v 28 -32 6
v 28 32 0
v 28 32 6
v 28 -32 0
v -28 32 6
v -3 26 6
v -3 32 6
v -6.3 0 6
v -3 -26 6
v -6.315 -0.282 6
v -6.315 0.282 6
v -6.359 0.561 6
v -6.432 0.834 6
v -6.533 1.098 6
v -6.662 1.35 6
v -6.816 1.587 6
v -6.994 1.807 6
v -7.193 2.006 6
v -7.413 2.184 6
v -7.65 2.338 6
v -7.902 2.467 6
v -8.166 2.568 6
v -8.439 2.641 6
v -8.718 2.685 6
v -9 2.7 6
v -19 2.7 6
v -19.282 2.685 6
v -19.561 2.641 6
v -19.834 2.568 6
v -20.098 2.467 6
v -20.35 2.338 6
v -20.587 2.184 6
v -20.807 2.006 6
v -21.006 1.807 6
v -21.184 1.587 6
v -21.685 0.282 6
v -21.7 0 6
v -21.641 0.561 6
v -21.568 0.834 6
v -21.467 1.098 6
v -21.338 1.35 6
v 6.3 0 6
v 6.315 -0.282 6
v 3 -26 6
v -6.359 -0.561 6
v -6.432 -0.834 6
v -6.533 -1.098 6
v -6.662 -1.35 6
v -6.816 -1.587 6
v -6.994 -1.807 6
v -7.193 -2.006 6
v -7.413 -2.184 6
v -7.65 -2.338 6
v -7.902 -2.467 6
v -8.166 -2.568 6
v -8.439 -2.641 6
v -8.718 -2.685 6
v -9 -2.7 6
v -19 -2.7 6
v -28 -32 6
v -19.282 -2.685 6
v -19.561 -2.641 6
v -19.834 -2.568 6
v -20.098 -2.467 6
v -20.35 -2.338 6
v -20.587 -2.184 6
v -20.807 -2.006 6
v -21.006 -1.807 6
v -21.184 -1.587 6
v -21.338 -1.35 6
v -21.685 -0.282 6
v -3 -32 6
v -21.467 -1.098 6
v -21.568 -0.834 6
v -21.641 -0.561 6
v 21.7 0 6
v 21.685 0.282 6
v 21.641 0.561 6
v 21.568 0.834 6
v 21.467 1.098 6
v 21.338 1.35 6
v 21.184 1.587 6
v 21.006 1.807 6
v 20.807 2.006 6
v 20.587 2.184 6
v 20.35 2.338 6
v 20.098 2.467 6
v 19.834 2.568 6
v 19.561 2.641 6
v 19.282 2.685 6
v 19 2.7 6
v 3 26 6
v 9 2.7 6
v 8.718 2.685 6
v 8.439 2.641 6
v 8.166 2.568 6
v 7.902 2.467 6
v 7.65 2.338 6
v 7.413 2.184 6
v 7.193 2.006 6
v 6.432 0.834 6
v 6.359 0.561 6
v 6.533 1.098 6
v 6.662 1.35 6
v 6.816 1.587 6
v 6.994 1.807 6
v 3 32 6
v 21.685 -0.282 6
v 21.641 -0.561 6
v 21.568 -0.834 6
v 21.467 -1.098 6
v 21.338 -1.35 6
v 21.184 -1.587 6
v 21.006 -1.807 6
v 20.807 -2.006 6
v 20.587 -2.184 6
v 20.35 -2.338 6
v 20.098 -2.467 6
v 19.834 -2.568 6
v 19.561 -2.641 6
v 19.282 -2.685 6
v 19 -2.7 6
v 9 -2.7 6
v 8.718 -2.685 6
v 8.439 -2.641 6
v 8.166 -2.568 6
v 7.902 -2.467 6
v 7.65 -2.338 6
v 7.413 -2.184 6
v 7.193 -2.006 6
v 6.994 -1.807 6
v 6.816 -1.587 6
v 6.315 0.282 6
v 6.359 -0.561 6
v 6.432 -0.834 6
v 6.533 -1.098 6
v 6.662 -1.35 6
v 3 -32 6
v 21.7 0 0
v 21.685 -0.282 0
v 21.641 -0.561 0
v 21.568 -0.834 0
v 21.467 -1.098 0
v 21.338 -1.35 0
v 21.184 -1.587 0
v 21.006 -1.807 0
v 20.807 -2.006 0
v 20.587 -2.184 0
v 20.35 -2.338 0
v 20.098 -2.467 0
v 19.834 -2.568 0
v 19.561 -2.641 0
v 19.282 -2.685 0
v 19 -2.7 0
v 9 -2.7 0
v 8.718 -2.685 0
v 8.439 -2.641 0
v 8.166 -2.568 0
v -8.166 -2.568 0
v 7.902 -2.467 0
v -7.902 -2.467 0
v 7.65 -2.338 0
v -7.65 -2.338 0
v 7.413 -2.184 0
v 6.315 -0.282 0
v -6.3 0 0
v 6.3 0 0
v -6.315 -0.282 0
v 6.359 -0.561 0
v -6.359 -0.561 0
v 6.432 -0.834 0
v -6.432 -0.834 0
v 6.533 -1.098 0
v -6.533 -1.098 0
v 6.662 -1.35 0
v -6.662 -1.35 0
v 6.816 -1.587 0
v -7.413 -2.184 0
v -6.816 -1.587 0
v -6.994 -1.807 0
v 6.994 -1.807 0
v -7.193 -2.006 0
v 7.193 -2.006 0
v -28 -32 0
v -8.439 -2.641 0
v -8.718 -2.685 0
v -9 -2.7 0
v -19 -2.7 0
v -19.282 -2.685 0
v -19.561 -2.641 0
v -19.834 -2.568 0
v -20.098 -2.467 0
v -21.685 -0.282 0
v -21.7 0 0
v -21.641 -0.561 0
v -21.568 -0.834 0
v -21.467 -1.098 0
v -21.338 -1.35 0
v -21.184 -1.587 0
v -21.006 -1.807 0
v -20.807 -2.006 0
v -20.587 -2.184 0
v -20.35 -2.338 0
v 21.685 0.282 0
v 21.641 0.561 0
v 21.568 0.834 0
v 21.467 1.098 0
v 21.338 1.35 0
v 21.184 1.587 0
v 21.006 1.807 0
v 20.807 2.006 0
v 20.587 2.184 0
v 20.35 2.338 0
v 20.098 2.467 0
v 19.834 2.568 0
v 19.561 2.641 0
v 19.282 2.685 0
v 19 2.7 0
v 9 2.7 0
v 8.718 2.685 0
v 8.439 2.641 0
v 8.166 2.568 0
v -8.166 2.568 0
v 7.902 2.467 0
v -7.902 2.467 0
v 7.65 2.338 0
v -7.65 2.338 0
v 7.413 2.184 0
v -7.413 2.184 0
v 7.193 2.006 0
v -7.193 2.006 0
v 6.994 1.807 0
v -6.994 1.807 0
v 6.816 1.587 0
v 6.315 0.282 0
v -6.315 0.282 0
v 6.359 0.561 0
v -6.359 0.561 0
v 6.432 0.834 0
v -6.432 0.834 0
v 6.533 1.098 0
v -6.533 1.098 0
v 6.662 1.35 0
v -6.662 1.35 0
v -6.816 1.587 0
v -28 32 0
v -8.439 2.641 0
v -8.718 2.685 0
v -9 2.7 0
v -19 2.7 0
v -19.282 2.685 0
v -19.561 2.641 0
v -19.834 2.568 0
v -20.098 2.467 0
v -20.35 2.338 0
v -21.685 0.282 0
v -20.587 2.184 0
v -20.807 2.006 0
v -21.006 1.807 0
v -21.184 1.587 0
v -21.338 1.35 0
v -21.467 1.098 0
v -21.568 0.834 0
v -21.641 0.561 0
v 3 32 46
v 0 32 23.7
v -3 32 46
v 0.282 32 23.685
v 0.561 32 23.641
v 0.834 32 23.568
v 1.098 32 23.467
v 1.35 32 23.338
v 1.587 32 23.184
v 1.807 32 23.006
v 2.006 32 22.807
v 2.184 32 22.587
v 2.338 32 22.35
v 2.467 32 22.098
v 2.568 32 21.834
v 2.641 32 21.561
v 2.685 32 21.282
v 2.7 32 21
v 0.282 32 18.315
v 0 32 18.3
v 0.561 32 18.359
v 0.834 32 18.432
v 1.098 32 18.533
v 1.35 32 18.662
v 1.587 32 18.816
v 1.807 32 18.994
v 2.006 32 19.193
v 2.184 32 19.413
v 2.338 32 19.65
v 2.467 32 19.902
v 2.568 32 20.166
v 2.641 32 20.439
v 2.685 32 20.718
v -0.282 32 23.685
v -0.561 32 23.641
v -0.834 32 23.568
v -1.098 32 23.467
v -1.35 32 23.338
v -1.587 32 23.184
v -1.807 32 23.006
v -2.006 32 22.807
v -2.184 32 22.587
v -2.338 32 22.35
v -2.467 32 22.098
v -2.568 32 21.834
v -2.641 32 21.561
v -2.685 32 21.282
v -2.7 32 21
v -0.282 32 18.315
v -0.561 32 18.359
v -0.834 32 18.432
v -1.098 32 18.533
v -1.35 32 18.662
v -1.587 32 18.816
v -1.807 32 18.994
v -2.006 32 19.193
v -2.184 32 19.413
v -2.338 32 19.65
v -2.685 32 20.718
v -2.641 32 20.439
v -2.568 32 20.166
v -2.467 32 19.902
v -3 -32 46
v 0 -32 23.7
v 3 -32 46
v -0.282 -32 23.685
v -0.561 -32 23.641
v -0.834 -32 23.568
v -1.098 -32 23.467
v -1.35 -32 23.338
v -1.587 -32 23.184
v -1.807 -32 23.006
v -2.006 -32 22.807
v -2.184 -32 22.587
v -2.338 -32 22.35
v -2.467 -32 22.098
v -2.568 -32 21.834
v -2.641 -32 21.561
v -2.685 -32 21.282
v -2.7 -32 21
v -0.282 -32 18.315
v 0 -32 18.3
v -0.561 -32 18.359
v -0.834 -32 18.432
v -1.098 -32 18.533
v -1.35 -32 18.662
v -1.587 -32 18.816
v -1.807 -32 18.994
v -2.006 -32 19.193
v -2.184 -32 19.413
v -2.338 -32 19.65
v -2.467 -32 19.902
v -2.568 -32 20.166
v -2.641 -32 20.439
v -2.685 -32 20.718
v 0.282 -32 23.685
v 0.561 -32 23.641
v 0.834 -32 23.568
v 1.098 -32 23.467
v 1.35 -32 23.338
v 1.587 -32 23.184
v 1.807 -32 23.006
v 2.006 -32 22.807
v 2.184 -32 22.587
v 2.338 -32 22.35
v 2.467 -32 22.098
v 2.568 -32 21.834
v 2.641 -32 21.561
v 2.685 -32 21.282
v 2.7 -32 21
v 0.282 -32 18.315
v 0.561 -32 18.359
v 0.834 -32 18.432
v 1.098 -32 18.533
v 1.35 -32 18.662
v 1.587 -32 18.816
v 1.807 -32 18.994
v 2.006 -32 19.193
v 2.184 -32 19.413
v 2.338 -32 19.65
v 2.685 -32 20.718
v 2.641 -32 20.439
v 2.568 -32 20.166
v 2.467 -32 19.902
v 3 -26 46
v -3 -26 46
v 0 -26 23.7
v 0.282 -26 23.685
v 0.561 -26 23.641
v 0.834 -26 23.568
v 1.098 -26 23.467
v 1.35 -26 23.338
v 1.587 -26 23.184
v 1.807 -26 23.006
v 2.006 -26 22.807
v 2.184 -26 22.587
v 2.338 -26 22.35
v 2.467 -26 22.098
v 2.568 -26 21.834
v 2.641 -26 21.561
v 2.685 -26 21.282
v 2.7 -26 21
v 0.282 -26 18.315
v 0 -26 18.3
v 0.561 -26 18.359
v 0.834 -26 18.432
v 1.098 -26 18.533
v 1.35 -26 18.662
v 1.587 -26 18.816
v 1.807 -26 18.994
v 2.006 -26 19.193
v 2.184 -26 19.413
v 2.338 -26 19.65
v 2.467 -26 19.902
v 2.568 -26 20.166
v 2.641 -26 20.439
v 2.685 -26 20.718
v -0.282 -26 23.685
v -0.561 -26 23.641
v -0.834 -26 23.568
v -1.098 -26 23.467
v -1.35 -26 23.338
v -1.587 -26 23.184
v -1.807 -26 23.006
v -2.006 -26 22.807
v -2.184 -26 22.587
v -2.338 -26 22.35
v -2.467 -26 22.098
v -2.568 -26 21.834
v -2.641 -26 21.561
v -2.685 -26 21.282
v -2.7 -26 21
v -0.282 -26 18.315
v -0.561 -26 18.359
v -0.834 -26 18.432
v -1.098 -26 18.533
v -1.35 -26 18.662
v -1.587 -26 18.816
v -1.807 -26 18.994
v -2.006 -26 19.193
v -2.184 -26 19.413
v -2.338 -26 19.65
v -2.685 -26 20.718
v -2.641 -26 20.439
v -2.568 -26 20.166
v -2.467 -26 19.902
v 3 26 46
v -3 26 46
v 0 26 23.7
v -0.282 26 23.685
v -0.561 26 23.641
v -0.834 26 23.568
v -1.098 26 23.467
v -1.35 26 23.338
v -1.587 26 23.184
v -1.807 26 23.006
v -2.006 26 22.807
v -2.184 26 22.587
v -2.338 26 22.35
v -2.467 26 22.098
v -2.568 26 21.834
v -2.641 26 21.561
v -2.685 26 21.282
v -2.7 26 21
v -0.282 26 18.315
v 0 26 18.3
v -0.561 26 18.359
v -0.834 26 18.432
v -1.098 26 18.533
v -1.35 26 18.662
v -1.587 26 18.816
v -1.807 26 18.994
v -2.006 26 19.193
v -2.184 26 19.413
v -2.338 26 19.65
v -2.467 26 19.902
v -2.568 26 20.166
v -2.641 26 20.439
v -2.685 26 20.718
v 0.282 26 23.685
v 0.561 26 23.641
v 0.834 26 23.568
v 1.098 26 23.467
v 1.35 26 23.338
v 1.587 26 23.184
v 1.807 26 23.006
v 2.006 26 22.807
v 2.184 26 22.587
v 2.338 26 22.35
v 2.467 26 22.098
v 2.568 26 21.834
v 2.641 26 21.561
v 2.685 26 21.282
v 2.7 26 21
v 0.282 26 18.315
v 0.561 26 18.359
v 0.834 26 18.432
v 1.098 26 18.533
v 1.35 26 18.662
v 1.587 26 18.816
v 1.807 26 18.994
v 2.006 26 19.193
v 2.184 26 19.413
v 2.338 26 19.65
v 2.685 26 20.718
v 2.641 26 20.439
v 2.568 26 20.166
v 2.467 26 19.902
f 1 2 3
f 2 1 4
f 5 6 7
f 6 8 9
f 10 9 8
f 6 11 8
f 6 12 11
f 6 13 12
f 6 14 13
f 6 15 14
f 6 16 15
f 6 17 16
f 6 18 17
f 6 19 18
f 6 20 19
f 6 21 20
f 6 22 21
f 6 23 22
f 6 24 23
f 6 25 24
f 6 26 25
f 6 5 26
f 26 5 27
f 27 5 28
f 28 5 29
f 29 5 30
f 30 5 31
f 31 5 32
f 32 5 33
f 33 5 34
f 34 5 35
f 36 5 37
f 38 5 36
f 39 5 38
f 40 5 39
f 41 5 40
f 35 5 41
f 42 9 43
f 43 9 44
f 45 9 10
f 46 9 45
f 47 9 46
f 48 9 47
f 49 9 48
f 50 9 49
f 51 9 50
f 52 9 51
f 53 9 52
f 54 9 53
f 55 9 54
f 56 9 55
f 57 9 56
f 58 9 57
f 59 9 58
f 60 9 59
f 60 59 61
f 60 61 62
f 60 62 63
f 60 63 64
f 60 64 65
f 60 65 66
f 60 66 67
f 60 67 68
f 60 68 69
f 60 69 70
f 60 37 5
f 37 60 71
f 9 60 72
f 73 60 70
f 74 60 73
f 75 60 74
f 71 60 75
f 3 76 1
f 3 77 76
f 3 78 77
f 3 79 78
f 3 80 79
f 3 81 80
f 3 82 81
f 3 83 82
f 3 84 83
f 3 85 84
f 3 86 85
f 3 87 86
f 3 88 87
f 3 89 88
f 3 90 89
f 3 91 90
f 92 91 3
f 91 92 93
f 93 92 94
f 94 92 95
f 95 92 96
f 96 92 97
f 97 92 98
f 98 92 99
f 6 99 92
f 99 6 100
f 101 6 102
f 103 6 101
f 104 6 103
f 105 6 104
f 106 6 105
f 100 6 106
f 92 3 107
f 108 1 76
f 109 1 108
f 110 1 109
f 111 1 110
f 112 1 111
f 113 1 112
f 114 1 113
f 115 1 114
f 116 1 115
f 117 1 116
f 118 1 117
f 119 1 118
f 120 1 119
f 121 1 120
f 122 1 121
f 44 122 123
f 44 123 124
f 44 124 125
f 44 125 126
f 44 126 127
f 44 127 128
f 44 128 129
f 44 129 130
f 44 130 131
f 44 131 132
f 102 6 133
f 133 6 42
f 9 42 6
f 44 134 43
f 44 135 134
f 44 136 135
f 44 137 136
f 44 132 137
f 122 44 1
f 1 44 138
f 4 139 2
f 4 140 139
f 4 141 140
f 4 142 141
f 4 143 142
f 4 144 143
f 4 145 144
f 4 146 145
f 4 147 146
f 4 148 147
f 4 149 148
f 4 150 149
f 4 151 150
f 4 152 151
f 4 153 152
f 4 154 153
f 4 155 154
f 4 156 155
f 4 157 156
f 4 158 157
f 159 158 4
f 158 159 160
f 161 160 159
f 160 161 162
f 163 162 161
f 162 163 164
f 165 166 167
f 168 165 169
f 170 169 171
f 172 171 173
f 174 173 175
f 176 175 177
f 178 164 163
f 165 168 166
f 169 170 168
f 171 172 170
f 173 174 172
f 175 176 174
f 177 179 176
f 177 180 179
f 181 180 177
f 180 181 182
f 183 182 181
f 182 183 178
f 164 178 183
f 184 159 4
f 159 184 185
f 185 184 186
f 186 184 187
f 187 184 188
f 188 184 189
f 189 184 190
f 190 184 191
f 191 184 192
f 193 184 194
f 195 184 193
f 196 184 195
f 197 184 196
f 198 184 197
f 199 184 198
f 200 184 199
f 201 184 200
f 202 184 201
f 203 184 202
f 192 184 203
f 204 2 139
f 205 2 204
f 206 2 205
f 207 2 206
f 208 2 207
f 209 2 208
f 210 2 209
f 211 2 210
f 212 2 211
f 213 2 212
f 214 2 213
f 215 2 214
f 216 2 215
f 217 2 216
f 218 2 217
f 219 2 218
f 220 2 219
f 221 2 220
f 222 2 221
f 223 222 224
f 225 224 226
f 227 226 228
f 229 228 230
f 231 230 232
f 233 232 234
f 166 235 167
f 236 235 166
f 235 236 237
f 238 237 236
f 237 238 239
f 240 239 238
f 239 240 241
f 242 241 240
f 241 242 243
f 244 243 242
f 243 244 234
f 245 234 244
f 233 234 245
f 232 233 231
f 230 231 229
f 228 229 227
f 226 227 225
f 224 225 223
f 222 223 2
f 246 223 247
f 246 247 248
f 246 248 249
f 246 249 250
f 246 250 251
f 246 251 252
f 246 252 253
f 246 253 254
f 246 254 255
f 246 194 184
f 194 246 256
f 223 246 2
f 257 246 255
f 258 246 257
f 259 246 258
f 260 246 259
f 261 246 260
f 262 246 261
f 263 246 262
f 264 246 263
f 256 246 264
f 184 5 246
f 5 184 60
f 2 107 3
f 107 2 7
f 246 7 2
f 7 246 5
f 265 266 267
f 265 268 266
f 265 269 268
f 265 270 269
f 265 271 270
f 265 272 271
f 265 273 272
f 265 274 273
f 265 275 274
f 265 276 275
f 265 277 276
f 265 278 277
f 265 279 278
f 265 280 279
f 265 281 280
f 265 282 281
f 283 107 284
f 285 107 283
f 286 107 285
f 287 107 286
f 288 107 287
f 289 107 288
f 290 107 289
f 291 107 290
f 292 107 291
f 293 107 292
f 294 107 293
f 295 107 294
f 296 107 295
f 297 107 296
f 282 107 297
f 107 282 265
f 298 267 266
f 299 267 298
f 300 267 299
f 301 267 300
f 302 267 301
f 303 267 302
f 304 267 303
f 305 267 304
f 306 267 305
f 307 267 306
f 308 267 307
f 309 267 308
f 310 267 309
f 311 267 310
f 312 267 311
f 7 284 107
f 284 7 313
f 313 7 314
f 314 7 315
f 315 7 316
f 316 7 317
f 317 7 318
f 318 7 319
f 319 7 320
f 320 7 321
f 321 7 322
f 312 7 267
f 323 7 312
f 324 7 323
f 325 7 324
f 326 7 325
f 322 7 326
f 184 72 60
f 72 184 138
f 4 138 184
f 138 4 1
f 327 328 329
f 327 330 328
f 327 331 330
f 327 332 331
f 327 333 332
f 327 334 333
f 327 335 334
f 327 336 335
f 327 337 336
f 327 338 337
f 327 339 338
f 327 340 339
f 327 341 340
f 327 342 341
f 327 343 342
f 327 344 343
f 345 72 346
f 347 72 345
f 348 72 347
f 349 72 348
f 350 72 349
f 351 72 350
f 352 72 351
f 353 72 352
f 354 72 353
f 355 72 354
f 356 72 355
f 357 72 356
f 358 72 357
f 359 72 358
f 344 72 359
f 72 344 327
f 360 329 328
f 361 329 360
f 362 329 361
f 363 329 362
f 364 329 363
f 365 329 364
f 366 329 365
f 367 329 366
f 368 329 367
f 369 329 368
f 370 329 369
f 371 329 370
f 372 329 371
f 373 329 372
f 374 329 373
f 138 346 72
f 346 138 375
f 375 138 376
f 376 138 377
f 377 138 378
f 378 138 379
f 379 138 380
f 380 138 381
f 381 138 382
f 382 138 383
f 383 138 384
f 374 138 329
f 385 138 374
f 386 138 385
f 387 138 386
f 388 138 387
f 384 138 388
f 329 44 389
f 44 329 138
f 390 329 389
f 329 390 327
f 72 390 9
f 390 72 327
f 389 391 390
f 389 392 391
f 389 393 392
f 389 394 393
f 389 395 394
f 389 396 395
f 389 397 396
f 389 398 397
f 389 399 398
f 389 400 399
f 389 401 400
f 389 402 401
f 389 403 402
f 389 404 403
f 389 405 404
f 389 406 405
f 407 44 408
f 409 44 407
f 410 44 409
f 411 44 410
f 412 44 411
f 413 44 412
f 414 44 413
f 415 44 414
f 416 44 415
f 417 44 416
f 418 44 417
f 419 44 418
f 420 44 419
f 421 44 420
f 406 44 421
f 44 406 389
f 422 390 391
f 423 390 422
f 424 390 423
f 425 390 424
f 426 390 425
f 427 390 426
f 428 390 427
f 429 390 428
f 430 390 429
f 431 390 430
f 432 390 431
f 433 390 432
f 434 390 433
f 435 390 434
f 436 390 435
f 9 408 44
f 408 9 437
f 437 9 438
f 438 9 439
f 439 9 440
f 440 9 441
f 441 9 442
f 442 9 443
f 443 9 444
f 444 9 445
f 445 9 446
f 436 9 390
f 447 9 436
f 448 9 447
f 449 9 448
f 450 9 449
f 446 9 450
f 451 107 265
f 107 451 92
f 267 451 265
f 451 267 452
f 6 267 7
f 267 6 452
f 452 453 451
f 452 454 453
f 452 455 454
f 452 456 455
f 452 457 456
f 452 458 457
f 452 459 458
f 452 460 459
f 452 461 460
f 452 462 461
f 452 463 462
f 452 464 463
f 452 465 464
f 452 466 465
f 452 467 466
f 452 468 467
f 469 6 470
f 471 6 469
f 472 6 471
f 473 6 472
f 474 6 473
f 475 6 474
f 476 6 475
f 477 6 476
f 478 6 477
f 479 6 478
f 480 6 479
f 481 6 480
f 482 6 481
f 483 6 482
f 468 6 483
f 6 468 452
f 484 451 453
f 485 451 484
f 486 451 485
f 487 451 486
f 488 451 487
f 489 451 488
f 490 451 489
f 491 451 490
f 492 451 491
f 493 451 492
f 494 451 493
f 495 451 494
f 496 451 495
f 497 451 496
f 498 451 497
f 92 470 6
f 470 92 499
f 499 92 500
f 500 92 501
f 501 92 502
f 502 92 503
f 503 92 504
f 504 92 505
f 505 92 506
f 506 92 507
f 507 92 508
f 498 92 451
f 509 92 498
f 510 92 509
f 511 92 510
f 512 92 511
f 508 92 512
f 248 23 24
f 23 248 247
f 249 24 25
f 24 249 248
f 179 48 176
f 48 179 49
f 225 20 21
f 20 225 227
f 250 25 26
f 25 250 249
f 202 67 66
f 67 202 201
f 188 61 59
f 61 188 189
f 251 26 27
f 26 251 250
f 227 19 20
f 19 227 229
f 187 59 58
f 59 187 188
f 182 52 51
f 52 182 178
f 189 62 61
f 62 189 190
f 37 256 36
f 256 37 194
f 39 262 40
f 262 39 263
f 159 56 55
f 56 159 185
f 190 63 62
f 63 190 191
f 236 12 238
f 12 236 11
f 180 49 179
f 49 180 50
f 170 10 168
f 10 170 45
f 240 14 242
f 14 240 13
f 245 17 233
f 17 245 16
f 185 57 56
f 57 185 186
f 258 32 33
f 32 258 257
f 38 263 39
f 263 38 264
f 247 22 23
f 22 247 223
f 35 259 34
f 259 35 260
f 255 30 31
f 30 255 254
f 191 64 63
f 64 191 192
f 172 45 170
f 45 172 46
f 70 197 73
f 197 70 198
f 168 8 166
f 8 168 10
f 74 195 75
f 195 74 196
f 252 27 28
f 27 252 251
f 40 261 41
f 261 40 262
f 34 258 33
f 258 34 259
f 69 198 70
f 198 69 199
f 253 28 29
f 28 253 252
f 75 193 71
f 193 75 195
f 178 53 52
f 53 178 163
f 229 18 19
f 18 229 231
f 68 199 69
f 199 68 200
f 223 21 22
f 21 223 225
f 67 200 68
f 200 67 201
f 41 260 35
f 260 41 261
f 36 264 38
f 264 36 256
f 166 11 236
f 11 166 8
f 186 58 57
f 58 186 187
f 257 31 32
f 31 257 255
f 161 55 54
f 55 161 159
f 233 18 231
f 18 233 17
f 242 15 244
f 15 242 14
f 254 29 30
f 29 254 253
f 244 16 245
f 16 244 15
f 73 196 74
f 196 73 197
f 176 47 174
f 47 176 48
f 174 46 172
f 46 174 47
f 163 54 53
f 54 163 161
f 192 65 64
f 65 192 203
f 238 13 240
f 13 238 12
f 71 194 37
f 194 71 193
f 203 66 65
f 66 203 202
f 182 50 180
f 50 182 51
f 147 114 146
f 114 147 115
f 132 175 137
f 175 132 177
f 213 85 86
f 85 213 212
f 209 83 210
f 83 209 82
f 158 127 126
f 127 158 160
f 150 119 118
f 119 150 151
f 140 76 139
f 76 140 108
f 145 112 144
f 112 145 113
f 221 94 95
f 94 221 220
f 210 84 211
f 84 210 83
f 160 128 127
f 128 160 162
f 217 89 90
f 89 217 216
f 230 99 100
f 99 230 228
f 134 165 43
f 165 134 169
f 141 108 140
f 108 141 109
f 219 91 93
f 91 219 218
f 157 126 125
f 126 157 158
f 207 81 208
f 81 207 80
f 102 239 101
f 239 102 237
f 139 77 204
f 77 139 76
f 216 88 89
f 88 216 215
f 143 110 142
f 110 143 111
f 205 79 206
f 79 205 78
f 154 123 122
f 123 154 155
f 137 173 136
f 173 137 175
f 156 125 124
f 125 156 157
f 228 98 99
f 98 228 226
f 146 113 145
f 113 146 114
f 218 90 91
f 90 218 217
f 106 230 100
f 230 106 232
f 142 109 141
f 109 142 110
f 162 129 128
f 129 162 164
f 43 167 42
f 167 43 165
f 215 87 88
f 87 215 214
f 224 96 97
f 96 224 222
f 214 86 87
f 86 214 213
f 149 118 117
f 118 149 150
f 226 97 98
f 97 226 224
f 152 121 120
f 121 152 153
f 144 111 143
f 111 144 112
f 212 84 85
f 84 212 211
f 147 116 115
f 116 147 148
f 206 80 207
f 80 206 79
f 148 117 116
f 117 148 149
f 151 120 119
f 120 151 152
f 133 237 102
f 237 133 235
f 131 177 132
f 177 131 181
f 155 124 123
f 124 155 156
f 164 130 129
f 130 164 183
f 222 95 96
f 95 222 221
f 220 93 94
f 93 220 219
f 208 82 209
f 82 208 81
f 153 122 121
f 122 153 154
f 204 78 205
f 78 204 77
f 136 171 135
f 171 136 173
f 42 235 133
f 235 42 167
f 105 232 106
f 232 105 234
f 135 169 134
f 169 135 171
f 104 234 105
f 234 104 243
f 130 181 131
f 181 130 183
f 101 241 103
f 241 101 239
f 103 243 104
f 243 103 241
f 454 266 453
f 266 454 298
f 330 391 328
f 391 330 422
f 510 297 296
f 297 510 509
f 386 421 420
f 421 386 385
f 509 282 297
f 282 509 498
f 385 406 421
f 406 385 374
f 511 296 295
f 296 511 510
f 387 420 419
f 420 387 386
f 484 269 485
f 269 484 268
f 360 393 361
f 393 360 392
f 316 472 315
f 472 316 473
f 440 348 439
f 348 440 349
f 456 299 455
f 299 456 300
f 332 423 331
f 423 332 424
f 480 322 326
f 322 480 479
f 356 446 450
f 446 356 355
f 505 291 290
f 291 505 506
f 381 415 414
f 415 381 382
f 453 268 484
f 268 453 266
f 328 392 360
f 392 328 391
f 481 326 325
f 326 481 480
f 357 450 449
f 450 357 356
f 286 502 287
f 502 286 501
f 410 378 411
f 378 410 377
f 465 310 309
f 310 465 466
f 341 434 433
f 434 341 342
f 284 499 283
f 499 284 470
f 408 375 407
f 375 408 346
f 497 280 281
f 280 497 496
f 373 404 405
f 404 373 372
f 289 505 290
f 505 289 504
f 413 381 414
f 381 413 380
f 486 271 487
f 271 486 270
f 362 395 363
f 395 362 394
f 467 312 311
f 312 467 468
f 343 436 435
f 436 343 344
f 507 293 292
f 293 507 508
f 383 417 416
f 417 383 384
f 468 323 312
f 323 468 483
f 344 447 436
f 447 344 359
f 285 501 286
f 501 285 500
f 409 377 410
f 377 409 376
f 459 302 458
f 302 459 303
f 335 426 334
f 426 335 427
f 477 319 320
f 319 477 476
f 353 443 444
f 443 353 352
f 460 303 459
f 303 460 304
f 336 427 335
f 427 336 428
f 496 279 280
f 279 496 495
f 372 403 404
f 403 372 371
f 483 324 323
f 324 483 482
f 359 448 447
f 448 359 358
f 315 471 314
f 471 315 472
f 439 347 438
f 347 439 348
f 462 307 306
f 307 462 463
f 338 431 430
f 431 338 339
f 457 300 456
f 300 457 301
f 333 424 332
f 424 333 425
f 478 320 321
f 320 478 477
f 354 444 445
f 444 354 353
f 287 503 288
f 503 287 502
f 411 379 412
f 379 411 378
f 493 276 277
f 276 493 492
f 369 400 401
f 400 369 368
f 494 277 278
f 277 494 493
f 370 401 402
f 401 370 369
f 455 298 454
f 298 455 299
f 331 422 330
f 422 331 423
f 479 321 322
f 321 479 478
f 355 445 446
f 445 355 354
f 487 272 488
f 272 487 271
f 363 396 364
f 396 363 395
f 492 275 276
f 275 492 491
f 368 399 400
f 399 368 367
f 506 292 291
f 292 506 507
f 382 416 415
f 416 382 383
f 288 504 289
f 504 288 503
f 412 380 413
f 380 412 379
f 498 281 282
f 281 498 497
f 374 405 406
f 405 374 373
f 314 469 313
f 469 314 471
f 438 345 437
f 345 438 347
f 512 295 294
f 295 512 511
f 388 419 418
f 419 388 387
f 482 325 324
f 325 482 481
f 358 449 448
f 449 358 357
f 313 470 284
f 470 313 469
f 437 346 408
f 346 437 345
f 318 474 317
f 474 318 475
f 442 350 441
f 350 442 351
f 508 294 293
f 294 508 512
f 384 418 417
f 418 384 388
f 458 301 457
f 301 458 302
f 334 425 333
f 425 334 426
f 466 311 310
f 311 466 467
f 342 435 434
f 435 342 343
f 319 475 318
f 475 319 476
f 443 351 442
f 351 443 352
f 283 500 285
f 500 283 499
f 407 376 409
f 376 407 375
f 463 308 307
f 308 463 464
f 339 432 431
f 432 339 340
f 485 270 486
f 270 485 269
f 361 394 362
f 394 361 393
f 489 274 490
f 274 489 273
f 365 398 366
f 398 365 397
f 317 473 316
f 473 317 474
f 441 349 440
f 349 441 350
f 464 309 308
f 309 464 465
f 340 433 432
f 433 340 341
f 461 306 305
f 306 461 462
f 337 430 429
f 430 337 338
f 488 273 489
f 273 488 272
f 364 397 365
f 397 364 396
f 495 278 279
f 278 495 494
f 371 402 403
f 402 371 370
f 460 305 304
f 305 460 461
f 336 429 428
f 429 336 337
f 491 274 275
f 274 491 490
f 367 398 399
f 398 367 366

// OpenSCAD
// U pivot bracket, 52 mm opening.
$fn = 60;
eps = 0.02;
base_l = 56;
base_w = 64;
base_t = 6;
ear_t = 6;
ear_h = 42;
pivot_d = 5.4;
module mount(x) {
    hull() {
        translate([x - 5, 0, -eps]) cylinder(d = 5.4, h = base_t + 2 * eps);
        translate([x + 5, 0, -eps]) cylinder(d = 5.4, h = base_t + 2 * eps);
    }
}
difference() {
    union() {
        translate([-base_l / 2, -base_w / 2, 0]) cube([base_l, base_w, base_t]);
        translate([-ear_t / 2, -base_w / 2, base_t - 2]) cube([ear_t, ear_t, ear_h]);
        translate([-ear_t / 2, base_w / 2 - ear_t, base_t - 2]) cube([ear_t, ear_t, ear_h]);
    }
    mount(-14); mount(14);
    translate([0, -base_w / 2 - eps, ear_h / 2]) rotate([-90, 0, 0]) cylinder(d = pivot_d, h = base_w + 2 * eps);
}
